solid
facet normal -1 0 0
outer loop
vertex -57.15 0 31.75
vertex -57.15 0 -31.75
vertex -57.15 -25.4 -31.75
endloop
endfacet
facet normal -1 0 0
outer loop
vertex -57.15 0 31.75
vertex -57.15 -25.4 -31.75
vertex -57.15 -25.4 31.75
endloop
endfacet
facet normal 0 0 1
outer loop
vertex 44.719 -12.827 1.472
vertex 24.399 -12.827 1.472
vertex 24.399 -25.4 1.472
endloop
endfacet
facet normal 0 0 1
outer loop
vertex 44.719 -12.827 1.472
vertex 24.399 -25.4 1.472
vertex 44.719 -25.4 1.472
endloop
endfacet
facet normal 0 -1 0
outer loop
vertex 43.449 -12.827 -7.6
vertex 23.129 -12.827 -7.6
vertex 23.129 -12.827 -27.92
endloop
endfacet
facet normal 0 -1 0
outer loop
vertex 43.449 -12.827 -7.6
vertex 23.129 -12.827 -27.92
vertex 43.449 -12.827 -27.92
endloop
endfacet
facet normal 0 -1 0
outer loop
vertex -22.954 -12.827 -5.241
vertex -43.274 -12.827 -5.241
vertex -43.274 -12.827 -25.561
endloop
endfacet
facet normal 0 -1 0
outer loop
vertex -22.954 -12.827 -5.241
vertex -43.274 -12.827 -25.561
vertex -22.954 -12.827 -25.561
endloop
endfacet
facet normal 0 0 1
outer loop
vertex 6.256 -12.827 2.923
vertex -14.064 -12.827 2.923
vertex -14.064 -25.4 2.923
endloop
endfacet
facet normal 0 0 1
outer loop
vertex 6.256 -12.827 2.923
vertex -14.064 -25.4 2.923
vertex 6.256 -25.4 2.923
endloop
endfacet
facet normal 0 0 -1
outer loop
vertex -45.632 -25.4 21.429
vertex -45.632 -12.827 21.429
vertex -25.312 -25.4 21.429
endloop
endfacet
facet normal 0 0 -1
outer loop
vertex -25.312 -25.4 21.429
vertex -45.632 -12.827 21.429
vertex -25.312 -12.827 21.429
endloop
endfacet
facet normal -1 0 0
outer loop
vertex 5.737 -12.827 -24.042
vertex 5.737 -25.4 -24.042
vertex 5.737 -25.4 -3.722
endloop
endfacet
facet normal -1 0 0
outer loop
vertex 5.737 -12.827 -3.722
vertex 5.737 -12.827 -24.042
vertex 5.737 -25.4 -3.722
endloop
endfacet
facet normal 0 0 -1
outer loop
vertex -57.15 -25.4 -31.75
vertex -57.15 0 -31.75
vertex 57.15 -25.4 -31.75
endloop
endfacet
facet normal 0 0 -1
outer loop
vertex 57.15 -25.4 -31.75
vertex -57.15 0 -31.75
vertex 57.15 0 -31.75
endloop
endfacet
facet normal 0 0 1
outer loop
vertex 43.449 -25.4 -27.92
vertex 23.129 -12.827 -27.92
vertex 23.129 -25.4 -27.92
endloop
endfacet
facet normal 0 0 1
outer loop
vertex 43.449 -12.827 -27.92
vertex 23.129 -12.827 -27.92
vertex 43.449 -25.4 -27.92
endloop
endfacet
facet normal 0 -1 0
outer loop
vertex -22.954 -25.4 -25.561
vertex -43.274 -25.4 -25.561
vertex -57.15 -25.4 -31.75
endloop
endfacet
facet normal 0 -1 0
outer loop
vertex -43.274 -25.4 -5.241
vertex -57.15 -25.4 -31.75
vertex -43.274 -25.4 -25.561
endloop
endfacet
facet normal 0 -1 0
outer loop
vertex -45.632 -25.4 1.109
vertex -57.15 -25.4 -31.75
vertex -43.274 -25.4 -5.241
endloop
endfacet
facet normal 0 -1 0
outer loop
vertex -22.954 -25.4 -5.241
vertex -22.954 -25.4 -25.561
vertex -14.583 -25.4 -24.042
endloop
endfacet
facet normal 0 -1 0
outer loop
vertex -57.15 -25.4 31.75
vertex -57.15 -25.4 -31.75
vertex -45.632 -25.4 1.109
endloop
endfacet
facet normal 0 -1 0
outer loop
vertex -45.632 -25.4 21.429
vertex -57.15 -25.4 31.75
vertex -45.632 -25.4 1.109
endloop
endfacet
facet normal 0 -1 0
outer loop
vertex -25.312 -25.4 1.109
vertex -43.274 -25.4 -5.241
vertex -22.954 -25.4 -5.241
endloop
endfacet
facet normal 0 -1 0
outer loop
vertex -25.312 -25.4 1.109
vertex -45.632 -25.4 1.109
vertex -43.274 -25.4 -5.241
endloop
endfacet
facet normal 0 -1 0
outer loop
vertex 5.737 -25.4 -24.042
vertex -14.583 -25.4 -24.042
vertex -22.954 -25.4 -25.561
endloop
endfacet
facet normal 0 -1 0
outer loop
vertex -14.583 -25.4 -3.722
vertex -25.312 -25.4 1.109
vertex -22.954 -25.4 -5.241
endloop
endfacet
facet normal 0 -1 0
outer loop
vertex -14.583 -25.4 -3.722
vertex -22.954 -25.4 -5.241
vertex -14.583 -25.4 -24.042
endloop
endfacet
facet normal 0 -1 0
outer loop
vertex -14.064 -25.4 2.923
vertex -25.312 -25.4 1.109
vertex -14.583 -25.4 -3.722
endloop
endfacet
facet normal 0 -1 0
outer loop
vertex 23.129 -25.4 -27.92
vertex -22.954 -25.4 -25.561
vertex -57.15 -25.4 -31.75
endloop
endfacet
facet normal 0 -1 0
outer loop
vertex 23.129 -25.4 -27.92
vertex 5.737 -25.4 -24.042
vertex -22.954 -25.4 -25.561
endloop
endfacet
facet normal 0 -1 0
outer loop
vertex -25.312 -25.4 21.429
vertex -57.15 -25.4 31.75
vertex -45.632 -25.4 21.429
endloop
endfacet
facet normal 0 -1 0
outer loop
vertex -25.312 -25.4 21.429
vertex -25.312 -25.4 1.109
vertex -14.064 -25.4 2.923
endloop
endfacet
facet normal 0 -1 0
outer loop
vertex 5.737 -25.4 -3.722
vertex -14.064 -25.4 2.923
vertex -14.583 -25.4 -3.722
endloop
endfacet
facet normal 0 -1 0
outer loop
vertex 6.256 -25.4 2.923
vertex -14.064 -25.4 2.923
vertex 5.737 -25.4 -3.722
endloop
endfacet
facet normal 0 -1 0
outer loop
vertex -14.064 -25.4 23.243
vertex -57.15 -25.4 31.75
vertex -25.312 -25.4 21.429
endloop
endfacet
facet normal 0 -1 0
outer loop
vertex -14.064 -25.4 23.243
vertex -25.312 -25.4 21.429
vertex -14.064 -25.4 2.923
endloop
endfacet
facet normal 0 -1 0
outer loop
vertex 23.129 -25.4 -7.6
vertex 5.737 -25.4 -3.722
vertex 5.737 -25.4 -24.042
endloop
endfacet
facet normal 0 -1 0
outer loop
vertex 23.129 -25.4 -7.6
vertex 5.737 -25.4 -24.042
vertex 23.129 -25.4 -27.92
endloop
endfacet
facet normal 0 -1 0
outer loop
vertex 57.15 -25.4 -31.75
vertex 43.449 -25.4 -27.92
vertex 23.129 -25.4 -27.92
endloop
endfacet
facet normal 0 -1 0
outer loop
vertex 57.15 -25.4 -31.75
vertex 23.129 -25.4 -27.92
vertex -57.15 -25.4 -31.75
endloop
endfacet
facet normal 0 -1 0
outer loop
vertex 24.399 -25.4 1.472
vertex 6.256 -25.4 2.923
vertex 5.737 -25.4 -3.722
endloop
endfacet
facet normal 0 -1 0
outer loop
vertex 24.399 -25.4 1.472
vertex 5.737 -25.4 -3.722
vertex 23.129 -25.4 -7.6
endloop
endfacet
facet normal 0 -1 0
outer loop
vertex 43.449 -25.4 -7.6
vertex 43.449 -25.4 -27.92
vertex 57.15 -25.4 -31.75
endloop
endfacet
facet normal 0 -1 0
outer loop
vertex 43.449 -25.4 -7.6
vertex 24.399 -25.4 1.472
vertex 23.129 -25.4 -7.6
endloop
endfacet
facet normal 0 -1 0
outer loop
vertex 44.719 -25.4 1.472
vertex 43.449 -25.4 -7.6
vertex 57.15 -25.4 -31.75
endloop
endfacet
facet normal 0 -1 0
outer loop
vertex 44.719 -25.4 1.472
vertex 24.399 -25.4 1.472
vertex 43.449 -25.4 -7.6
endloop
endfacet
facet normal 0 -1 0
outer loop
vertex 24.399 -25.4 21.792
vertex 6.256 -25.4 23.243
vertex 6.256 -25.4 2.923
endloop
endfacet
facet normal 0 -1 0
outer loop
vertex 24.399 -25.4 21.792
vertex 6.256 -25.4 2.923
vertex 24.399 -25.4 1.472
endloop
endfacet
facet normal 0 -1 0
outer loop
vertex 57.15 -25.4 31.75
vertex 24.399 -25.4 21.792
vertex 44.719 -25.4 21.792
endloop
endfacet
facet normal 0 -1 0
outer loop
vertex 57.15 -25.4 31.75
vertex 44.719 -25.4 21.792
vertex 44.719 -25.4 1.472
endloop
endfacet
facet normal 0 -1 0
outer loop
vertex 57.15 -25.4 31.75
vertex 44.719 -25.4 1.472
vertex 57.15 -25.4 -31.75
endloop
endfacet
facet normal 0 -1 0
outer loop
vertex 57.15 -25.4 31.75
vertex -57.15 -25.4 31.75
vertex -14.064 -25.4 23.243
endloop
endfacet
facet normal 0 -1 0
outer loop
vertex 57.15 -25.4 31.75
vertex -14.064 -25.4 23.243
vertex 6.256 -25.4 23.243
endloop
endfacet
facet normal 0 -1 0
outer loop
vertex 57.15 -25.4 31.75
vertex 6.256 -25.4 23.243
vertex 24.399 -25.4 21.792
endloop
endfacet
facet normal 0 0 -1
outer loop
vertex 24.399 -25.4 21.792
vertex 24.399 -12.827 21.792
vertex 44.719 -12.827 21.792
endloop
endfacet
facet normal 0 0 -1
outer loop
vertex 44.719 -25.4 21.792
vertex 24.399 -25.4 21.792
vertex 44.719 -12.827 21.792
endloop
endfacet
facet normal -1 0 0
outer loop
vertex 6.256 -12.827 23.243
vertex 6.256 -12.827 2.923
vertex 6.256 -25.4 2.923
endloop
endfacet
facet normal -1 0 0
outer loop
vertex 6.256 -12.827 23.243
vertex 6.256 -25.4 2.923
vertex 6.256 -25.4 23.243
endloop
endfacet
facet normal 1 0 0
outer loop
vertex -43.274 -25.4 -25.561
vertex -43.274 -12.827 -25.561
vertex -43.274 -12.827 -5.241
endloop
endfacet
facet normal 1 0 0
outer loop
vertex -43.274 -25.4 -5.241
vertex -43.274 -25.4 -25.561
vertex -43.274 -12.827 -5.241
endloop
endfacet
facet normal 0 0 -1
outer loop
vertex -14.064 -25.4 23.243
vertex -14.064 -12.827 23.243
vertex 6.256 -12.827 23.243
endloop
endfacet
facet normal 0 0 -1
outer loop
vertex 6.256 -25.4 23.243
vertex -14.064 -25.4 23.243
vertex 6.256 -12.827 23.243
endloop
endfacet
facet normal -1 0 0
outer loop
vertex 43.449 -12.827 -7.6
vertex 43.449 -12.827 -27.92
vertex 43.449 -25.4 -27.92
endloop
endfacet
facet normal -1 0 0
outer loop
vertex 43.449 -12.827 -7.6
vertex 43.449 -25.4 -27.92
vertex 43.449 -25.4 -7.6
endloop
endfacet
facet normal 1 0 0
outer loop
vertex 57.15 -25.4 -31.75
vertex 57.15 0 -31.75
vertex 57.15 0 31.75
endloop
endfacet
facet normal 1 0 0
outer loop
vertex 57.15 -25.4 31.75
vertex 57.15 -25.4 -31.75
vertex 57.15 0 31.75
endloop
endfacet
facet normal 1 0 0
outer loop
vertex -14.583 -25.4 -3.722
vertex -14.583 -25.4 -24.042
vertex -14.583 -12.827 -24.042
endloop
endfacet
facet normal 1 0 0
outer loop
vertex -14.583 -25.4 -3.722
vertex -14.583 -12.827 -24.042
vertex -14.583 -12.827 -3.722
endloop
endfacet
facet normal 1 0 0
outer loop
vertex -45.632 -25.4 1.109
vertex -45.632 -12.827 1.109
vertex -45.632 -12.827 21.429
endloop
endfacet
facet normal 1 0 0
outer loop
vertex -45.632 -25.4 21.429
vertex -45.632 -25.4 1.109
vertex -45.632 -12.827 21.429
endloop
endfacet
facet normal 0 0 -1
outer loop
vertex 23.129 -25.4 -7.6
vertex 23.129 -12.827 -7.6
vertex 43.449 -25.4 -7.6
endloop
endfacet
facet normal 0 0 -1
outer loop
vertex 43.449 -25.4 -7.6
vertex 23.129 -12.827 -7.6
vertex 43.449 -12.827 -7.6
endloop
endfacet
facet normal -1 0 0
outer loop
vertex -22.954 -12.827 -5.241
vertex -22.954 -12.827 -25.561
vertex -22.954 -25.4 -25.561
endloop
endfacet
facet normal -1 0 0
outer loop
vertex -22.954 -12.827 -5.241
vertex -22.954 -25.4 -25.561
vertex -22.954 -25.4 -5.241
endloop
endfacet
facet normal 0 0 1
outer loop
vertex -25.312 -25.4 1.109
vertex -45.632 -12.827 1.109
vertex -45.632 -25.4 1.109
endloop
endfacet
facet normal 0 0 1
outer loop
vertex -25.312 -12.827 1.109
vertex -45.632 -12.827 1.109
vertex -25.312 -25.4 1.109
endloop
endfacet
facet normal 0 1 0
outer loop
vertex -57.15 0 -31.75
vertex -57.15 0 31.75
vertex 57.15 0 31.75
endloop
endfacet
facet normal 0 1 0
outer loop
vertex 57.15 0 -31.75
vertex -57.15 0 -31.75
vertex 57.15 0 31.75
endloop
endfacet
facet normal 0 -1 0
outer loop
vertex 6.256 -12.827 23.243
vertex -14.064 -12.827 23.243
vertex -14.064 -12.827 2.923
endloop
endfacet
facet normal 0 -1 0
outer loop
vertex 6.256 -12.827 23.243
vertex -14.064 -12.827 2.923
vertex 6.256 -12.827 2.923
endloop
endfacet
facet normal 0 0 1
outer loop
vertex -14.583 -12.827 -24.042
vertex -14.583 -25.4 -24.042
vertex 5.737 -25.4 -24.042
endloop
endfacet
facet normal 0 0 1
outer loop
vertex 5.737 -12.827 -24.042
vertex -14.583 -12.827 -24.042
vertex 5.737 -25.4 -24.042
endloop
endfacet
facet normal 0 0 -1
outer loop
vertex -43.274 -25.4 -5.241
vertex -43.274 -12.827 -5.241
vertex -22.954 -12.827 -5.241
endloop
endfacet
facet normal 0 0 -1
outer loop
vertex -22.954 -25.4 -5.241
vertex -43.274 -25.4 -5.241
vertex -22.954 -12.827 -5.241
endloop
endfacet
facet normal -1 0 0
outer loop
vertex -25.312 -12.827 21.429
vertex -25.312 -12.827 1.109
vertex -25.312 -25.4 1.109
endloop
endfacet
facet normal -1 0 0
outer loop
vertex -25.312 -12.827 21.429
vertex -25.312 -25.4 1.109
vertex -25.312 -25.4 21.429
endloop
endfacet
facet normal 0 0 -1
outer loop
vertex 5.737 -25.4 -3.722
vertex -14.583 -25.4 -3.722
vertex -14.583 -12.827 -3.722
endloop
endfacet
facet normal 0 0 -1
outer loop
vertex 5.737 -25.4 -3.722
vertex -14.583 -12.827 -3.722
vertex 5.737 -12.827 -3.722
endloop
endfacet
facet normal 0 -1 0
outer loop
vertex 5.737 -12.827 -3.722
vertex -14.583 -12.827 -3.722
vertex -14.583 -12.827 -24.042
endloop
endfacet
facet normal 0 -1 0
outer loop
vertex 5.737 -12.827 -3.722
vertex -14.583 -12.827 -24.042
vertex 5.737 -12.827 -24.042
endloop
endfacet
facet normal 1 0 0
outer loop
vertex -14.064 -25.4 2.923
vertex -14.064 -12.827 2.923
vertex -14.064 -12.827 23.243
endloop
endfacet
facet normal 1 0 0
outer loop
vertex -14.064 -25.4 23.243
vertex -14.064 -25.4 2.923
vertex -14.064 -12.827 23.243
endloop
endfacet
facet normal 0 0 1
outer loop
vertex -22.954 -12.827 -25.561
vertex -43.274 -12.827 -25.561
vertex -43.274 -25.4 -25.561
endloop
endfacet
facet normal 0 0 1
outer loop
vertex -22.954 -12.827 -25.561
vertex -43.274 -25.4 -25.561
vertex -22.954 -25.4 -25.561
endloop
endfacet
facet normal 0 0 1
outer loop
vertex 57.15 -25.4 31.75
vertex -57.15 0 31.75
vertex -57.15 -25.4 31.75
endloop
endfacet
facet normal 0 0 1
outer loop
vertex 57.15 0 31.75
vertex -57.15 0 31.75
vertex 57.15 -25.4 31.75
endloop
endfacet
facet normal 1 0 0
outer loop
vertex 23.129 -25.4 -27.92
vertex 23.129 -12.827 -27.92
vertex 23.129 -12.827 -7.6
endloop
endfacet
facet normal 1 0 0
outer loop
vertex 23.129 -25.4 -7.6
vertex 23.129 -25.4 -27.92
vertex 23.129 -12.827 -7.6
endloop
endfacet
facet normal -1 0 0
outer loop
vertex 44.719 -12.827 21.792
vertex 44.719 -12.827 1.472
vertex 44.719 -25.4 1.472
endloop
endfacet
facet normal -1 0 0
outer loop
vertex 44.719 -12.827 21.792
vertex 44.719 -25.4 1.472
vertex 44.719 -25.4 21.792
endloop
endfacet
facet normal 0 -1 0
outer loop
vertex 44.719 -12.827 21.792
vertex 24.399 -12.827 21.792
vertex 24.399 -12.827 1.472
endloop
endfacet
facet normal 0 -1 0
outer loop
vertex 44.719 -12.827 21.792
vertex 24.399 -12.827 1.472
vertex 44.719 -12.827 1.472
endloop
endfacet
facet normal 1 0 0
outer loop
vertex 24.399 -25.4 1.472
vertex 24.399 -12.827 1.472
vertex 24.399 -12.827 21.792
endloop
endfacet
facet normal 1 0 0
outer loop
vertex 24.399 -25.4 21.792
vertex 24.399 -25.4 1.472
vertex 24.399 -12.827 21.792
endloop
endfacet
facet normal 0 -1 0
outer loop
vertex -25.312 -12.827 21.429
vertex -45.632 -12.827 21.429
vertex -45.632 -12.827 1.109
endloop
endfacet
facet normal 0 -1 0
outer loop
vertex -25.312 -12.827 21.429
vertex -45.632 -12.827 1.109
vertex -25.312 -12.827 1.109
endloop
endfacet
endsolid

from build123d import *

# Parameters (mm, degrees)
F0_W     = 114.3
F0_H     = 63.5
F1_DEPTH = 25.4
F2_W     = 20.32
F2_H     = 20.32
F3_DEPTH = 12.573


with BuildPart() as f1:
    # F0 (on Front) → F1 (new body)
    with BuildSketch(Plane.XZ):
        Rectangle(F0_W, F0_H)
    extrude(amount=F1_DEPTH)

    # F2 (on face) → F3 (cut, symmetric)
    with BuildSketch(Plane.XZ.offset(25.4)):
        with Locations((-35.47241, 11.268726)):
            Rectangle(F2_W, F2_H)
        with Locations((-3.90384, 13.083012)):
            Rectangle(F2_W, F2_H)
        with Locations((34.559014, 11.631584)):
            Rectangle(F2_W, F2_H)
        with Locations((-33.113839, -15.401271)):
            Rectangle(F2_W, F2_H)
        with Locations((33.289013, -17.759843)):
            Rectangle(F2_W, F2_H)
        with Locations((-4.423103, -13.882415)):
            Rectangle(F2_W, F2_H)
    extrude(amount=F3_DEPTH, both=True, mode=Mode.SUBTRACT)


solid = f1.part
